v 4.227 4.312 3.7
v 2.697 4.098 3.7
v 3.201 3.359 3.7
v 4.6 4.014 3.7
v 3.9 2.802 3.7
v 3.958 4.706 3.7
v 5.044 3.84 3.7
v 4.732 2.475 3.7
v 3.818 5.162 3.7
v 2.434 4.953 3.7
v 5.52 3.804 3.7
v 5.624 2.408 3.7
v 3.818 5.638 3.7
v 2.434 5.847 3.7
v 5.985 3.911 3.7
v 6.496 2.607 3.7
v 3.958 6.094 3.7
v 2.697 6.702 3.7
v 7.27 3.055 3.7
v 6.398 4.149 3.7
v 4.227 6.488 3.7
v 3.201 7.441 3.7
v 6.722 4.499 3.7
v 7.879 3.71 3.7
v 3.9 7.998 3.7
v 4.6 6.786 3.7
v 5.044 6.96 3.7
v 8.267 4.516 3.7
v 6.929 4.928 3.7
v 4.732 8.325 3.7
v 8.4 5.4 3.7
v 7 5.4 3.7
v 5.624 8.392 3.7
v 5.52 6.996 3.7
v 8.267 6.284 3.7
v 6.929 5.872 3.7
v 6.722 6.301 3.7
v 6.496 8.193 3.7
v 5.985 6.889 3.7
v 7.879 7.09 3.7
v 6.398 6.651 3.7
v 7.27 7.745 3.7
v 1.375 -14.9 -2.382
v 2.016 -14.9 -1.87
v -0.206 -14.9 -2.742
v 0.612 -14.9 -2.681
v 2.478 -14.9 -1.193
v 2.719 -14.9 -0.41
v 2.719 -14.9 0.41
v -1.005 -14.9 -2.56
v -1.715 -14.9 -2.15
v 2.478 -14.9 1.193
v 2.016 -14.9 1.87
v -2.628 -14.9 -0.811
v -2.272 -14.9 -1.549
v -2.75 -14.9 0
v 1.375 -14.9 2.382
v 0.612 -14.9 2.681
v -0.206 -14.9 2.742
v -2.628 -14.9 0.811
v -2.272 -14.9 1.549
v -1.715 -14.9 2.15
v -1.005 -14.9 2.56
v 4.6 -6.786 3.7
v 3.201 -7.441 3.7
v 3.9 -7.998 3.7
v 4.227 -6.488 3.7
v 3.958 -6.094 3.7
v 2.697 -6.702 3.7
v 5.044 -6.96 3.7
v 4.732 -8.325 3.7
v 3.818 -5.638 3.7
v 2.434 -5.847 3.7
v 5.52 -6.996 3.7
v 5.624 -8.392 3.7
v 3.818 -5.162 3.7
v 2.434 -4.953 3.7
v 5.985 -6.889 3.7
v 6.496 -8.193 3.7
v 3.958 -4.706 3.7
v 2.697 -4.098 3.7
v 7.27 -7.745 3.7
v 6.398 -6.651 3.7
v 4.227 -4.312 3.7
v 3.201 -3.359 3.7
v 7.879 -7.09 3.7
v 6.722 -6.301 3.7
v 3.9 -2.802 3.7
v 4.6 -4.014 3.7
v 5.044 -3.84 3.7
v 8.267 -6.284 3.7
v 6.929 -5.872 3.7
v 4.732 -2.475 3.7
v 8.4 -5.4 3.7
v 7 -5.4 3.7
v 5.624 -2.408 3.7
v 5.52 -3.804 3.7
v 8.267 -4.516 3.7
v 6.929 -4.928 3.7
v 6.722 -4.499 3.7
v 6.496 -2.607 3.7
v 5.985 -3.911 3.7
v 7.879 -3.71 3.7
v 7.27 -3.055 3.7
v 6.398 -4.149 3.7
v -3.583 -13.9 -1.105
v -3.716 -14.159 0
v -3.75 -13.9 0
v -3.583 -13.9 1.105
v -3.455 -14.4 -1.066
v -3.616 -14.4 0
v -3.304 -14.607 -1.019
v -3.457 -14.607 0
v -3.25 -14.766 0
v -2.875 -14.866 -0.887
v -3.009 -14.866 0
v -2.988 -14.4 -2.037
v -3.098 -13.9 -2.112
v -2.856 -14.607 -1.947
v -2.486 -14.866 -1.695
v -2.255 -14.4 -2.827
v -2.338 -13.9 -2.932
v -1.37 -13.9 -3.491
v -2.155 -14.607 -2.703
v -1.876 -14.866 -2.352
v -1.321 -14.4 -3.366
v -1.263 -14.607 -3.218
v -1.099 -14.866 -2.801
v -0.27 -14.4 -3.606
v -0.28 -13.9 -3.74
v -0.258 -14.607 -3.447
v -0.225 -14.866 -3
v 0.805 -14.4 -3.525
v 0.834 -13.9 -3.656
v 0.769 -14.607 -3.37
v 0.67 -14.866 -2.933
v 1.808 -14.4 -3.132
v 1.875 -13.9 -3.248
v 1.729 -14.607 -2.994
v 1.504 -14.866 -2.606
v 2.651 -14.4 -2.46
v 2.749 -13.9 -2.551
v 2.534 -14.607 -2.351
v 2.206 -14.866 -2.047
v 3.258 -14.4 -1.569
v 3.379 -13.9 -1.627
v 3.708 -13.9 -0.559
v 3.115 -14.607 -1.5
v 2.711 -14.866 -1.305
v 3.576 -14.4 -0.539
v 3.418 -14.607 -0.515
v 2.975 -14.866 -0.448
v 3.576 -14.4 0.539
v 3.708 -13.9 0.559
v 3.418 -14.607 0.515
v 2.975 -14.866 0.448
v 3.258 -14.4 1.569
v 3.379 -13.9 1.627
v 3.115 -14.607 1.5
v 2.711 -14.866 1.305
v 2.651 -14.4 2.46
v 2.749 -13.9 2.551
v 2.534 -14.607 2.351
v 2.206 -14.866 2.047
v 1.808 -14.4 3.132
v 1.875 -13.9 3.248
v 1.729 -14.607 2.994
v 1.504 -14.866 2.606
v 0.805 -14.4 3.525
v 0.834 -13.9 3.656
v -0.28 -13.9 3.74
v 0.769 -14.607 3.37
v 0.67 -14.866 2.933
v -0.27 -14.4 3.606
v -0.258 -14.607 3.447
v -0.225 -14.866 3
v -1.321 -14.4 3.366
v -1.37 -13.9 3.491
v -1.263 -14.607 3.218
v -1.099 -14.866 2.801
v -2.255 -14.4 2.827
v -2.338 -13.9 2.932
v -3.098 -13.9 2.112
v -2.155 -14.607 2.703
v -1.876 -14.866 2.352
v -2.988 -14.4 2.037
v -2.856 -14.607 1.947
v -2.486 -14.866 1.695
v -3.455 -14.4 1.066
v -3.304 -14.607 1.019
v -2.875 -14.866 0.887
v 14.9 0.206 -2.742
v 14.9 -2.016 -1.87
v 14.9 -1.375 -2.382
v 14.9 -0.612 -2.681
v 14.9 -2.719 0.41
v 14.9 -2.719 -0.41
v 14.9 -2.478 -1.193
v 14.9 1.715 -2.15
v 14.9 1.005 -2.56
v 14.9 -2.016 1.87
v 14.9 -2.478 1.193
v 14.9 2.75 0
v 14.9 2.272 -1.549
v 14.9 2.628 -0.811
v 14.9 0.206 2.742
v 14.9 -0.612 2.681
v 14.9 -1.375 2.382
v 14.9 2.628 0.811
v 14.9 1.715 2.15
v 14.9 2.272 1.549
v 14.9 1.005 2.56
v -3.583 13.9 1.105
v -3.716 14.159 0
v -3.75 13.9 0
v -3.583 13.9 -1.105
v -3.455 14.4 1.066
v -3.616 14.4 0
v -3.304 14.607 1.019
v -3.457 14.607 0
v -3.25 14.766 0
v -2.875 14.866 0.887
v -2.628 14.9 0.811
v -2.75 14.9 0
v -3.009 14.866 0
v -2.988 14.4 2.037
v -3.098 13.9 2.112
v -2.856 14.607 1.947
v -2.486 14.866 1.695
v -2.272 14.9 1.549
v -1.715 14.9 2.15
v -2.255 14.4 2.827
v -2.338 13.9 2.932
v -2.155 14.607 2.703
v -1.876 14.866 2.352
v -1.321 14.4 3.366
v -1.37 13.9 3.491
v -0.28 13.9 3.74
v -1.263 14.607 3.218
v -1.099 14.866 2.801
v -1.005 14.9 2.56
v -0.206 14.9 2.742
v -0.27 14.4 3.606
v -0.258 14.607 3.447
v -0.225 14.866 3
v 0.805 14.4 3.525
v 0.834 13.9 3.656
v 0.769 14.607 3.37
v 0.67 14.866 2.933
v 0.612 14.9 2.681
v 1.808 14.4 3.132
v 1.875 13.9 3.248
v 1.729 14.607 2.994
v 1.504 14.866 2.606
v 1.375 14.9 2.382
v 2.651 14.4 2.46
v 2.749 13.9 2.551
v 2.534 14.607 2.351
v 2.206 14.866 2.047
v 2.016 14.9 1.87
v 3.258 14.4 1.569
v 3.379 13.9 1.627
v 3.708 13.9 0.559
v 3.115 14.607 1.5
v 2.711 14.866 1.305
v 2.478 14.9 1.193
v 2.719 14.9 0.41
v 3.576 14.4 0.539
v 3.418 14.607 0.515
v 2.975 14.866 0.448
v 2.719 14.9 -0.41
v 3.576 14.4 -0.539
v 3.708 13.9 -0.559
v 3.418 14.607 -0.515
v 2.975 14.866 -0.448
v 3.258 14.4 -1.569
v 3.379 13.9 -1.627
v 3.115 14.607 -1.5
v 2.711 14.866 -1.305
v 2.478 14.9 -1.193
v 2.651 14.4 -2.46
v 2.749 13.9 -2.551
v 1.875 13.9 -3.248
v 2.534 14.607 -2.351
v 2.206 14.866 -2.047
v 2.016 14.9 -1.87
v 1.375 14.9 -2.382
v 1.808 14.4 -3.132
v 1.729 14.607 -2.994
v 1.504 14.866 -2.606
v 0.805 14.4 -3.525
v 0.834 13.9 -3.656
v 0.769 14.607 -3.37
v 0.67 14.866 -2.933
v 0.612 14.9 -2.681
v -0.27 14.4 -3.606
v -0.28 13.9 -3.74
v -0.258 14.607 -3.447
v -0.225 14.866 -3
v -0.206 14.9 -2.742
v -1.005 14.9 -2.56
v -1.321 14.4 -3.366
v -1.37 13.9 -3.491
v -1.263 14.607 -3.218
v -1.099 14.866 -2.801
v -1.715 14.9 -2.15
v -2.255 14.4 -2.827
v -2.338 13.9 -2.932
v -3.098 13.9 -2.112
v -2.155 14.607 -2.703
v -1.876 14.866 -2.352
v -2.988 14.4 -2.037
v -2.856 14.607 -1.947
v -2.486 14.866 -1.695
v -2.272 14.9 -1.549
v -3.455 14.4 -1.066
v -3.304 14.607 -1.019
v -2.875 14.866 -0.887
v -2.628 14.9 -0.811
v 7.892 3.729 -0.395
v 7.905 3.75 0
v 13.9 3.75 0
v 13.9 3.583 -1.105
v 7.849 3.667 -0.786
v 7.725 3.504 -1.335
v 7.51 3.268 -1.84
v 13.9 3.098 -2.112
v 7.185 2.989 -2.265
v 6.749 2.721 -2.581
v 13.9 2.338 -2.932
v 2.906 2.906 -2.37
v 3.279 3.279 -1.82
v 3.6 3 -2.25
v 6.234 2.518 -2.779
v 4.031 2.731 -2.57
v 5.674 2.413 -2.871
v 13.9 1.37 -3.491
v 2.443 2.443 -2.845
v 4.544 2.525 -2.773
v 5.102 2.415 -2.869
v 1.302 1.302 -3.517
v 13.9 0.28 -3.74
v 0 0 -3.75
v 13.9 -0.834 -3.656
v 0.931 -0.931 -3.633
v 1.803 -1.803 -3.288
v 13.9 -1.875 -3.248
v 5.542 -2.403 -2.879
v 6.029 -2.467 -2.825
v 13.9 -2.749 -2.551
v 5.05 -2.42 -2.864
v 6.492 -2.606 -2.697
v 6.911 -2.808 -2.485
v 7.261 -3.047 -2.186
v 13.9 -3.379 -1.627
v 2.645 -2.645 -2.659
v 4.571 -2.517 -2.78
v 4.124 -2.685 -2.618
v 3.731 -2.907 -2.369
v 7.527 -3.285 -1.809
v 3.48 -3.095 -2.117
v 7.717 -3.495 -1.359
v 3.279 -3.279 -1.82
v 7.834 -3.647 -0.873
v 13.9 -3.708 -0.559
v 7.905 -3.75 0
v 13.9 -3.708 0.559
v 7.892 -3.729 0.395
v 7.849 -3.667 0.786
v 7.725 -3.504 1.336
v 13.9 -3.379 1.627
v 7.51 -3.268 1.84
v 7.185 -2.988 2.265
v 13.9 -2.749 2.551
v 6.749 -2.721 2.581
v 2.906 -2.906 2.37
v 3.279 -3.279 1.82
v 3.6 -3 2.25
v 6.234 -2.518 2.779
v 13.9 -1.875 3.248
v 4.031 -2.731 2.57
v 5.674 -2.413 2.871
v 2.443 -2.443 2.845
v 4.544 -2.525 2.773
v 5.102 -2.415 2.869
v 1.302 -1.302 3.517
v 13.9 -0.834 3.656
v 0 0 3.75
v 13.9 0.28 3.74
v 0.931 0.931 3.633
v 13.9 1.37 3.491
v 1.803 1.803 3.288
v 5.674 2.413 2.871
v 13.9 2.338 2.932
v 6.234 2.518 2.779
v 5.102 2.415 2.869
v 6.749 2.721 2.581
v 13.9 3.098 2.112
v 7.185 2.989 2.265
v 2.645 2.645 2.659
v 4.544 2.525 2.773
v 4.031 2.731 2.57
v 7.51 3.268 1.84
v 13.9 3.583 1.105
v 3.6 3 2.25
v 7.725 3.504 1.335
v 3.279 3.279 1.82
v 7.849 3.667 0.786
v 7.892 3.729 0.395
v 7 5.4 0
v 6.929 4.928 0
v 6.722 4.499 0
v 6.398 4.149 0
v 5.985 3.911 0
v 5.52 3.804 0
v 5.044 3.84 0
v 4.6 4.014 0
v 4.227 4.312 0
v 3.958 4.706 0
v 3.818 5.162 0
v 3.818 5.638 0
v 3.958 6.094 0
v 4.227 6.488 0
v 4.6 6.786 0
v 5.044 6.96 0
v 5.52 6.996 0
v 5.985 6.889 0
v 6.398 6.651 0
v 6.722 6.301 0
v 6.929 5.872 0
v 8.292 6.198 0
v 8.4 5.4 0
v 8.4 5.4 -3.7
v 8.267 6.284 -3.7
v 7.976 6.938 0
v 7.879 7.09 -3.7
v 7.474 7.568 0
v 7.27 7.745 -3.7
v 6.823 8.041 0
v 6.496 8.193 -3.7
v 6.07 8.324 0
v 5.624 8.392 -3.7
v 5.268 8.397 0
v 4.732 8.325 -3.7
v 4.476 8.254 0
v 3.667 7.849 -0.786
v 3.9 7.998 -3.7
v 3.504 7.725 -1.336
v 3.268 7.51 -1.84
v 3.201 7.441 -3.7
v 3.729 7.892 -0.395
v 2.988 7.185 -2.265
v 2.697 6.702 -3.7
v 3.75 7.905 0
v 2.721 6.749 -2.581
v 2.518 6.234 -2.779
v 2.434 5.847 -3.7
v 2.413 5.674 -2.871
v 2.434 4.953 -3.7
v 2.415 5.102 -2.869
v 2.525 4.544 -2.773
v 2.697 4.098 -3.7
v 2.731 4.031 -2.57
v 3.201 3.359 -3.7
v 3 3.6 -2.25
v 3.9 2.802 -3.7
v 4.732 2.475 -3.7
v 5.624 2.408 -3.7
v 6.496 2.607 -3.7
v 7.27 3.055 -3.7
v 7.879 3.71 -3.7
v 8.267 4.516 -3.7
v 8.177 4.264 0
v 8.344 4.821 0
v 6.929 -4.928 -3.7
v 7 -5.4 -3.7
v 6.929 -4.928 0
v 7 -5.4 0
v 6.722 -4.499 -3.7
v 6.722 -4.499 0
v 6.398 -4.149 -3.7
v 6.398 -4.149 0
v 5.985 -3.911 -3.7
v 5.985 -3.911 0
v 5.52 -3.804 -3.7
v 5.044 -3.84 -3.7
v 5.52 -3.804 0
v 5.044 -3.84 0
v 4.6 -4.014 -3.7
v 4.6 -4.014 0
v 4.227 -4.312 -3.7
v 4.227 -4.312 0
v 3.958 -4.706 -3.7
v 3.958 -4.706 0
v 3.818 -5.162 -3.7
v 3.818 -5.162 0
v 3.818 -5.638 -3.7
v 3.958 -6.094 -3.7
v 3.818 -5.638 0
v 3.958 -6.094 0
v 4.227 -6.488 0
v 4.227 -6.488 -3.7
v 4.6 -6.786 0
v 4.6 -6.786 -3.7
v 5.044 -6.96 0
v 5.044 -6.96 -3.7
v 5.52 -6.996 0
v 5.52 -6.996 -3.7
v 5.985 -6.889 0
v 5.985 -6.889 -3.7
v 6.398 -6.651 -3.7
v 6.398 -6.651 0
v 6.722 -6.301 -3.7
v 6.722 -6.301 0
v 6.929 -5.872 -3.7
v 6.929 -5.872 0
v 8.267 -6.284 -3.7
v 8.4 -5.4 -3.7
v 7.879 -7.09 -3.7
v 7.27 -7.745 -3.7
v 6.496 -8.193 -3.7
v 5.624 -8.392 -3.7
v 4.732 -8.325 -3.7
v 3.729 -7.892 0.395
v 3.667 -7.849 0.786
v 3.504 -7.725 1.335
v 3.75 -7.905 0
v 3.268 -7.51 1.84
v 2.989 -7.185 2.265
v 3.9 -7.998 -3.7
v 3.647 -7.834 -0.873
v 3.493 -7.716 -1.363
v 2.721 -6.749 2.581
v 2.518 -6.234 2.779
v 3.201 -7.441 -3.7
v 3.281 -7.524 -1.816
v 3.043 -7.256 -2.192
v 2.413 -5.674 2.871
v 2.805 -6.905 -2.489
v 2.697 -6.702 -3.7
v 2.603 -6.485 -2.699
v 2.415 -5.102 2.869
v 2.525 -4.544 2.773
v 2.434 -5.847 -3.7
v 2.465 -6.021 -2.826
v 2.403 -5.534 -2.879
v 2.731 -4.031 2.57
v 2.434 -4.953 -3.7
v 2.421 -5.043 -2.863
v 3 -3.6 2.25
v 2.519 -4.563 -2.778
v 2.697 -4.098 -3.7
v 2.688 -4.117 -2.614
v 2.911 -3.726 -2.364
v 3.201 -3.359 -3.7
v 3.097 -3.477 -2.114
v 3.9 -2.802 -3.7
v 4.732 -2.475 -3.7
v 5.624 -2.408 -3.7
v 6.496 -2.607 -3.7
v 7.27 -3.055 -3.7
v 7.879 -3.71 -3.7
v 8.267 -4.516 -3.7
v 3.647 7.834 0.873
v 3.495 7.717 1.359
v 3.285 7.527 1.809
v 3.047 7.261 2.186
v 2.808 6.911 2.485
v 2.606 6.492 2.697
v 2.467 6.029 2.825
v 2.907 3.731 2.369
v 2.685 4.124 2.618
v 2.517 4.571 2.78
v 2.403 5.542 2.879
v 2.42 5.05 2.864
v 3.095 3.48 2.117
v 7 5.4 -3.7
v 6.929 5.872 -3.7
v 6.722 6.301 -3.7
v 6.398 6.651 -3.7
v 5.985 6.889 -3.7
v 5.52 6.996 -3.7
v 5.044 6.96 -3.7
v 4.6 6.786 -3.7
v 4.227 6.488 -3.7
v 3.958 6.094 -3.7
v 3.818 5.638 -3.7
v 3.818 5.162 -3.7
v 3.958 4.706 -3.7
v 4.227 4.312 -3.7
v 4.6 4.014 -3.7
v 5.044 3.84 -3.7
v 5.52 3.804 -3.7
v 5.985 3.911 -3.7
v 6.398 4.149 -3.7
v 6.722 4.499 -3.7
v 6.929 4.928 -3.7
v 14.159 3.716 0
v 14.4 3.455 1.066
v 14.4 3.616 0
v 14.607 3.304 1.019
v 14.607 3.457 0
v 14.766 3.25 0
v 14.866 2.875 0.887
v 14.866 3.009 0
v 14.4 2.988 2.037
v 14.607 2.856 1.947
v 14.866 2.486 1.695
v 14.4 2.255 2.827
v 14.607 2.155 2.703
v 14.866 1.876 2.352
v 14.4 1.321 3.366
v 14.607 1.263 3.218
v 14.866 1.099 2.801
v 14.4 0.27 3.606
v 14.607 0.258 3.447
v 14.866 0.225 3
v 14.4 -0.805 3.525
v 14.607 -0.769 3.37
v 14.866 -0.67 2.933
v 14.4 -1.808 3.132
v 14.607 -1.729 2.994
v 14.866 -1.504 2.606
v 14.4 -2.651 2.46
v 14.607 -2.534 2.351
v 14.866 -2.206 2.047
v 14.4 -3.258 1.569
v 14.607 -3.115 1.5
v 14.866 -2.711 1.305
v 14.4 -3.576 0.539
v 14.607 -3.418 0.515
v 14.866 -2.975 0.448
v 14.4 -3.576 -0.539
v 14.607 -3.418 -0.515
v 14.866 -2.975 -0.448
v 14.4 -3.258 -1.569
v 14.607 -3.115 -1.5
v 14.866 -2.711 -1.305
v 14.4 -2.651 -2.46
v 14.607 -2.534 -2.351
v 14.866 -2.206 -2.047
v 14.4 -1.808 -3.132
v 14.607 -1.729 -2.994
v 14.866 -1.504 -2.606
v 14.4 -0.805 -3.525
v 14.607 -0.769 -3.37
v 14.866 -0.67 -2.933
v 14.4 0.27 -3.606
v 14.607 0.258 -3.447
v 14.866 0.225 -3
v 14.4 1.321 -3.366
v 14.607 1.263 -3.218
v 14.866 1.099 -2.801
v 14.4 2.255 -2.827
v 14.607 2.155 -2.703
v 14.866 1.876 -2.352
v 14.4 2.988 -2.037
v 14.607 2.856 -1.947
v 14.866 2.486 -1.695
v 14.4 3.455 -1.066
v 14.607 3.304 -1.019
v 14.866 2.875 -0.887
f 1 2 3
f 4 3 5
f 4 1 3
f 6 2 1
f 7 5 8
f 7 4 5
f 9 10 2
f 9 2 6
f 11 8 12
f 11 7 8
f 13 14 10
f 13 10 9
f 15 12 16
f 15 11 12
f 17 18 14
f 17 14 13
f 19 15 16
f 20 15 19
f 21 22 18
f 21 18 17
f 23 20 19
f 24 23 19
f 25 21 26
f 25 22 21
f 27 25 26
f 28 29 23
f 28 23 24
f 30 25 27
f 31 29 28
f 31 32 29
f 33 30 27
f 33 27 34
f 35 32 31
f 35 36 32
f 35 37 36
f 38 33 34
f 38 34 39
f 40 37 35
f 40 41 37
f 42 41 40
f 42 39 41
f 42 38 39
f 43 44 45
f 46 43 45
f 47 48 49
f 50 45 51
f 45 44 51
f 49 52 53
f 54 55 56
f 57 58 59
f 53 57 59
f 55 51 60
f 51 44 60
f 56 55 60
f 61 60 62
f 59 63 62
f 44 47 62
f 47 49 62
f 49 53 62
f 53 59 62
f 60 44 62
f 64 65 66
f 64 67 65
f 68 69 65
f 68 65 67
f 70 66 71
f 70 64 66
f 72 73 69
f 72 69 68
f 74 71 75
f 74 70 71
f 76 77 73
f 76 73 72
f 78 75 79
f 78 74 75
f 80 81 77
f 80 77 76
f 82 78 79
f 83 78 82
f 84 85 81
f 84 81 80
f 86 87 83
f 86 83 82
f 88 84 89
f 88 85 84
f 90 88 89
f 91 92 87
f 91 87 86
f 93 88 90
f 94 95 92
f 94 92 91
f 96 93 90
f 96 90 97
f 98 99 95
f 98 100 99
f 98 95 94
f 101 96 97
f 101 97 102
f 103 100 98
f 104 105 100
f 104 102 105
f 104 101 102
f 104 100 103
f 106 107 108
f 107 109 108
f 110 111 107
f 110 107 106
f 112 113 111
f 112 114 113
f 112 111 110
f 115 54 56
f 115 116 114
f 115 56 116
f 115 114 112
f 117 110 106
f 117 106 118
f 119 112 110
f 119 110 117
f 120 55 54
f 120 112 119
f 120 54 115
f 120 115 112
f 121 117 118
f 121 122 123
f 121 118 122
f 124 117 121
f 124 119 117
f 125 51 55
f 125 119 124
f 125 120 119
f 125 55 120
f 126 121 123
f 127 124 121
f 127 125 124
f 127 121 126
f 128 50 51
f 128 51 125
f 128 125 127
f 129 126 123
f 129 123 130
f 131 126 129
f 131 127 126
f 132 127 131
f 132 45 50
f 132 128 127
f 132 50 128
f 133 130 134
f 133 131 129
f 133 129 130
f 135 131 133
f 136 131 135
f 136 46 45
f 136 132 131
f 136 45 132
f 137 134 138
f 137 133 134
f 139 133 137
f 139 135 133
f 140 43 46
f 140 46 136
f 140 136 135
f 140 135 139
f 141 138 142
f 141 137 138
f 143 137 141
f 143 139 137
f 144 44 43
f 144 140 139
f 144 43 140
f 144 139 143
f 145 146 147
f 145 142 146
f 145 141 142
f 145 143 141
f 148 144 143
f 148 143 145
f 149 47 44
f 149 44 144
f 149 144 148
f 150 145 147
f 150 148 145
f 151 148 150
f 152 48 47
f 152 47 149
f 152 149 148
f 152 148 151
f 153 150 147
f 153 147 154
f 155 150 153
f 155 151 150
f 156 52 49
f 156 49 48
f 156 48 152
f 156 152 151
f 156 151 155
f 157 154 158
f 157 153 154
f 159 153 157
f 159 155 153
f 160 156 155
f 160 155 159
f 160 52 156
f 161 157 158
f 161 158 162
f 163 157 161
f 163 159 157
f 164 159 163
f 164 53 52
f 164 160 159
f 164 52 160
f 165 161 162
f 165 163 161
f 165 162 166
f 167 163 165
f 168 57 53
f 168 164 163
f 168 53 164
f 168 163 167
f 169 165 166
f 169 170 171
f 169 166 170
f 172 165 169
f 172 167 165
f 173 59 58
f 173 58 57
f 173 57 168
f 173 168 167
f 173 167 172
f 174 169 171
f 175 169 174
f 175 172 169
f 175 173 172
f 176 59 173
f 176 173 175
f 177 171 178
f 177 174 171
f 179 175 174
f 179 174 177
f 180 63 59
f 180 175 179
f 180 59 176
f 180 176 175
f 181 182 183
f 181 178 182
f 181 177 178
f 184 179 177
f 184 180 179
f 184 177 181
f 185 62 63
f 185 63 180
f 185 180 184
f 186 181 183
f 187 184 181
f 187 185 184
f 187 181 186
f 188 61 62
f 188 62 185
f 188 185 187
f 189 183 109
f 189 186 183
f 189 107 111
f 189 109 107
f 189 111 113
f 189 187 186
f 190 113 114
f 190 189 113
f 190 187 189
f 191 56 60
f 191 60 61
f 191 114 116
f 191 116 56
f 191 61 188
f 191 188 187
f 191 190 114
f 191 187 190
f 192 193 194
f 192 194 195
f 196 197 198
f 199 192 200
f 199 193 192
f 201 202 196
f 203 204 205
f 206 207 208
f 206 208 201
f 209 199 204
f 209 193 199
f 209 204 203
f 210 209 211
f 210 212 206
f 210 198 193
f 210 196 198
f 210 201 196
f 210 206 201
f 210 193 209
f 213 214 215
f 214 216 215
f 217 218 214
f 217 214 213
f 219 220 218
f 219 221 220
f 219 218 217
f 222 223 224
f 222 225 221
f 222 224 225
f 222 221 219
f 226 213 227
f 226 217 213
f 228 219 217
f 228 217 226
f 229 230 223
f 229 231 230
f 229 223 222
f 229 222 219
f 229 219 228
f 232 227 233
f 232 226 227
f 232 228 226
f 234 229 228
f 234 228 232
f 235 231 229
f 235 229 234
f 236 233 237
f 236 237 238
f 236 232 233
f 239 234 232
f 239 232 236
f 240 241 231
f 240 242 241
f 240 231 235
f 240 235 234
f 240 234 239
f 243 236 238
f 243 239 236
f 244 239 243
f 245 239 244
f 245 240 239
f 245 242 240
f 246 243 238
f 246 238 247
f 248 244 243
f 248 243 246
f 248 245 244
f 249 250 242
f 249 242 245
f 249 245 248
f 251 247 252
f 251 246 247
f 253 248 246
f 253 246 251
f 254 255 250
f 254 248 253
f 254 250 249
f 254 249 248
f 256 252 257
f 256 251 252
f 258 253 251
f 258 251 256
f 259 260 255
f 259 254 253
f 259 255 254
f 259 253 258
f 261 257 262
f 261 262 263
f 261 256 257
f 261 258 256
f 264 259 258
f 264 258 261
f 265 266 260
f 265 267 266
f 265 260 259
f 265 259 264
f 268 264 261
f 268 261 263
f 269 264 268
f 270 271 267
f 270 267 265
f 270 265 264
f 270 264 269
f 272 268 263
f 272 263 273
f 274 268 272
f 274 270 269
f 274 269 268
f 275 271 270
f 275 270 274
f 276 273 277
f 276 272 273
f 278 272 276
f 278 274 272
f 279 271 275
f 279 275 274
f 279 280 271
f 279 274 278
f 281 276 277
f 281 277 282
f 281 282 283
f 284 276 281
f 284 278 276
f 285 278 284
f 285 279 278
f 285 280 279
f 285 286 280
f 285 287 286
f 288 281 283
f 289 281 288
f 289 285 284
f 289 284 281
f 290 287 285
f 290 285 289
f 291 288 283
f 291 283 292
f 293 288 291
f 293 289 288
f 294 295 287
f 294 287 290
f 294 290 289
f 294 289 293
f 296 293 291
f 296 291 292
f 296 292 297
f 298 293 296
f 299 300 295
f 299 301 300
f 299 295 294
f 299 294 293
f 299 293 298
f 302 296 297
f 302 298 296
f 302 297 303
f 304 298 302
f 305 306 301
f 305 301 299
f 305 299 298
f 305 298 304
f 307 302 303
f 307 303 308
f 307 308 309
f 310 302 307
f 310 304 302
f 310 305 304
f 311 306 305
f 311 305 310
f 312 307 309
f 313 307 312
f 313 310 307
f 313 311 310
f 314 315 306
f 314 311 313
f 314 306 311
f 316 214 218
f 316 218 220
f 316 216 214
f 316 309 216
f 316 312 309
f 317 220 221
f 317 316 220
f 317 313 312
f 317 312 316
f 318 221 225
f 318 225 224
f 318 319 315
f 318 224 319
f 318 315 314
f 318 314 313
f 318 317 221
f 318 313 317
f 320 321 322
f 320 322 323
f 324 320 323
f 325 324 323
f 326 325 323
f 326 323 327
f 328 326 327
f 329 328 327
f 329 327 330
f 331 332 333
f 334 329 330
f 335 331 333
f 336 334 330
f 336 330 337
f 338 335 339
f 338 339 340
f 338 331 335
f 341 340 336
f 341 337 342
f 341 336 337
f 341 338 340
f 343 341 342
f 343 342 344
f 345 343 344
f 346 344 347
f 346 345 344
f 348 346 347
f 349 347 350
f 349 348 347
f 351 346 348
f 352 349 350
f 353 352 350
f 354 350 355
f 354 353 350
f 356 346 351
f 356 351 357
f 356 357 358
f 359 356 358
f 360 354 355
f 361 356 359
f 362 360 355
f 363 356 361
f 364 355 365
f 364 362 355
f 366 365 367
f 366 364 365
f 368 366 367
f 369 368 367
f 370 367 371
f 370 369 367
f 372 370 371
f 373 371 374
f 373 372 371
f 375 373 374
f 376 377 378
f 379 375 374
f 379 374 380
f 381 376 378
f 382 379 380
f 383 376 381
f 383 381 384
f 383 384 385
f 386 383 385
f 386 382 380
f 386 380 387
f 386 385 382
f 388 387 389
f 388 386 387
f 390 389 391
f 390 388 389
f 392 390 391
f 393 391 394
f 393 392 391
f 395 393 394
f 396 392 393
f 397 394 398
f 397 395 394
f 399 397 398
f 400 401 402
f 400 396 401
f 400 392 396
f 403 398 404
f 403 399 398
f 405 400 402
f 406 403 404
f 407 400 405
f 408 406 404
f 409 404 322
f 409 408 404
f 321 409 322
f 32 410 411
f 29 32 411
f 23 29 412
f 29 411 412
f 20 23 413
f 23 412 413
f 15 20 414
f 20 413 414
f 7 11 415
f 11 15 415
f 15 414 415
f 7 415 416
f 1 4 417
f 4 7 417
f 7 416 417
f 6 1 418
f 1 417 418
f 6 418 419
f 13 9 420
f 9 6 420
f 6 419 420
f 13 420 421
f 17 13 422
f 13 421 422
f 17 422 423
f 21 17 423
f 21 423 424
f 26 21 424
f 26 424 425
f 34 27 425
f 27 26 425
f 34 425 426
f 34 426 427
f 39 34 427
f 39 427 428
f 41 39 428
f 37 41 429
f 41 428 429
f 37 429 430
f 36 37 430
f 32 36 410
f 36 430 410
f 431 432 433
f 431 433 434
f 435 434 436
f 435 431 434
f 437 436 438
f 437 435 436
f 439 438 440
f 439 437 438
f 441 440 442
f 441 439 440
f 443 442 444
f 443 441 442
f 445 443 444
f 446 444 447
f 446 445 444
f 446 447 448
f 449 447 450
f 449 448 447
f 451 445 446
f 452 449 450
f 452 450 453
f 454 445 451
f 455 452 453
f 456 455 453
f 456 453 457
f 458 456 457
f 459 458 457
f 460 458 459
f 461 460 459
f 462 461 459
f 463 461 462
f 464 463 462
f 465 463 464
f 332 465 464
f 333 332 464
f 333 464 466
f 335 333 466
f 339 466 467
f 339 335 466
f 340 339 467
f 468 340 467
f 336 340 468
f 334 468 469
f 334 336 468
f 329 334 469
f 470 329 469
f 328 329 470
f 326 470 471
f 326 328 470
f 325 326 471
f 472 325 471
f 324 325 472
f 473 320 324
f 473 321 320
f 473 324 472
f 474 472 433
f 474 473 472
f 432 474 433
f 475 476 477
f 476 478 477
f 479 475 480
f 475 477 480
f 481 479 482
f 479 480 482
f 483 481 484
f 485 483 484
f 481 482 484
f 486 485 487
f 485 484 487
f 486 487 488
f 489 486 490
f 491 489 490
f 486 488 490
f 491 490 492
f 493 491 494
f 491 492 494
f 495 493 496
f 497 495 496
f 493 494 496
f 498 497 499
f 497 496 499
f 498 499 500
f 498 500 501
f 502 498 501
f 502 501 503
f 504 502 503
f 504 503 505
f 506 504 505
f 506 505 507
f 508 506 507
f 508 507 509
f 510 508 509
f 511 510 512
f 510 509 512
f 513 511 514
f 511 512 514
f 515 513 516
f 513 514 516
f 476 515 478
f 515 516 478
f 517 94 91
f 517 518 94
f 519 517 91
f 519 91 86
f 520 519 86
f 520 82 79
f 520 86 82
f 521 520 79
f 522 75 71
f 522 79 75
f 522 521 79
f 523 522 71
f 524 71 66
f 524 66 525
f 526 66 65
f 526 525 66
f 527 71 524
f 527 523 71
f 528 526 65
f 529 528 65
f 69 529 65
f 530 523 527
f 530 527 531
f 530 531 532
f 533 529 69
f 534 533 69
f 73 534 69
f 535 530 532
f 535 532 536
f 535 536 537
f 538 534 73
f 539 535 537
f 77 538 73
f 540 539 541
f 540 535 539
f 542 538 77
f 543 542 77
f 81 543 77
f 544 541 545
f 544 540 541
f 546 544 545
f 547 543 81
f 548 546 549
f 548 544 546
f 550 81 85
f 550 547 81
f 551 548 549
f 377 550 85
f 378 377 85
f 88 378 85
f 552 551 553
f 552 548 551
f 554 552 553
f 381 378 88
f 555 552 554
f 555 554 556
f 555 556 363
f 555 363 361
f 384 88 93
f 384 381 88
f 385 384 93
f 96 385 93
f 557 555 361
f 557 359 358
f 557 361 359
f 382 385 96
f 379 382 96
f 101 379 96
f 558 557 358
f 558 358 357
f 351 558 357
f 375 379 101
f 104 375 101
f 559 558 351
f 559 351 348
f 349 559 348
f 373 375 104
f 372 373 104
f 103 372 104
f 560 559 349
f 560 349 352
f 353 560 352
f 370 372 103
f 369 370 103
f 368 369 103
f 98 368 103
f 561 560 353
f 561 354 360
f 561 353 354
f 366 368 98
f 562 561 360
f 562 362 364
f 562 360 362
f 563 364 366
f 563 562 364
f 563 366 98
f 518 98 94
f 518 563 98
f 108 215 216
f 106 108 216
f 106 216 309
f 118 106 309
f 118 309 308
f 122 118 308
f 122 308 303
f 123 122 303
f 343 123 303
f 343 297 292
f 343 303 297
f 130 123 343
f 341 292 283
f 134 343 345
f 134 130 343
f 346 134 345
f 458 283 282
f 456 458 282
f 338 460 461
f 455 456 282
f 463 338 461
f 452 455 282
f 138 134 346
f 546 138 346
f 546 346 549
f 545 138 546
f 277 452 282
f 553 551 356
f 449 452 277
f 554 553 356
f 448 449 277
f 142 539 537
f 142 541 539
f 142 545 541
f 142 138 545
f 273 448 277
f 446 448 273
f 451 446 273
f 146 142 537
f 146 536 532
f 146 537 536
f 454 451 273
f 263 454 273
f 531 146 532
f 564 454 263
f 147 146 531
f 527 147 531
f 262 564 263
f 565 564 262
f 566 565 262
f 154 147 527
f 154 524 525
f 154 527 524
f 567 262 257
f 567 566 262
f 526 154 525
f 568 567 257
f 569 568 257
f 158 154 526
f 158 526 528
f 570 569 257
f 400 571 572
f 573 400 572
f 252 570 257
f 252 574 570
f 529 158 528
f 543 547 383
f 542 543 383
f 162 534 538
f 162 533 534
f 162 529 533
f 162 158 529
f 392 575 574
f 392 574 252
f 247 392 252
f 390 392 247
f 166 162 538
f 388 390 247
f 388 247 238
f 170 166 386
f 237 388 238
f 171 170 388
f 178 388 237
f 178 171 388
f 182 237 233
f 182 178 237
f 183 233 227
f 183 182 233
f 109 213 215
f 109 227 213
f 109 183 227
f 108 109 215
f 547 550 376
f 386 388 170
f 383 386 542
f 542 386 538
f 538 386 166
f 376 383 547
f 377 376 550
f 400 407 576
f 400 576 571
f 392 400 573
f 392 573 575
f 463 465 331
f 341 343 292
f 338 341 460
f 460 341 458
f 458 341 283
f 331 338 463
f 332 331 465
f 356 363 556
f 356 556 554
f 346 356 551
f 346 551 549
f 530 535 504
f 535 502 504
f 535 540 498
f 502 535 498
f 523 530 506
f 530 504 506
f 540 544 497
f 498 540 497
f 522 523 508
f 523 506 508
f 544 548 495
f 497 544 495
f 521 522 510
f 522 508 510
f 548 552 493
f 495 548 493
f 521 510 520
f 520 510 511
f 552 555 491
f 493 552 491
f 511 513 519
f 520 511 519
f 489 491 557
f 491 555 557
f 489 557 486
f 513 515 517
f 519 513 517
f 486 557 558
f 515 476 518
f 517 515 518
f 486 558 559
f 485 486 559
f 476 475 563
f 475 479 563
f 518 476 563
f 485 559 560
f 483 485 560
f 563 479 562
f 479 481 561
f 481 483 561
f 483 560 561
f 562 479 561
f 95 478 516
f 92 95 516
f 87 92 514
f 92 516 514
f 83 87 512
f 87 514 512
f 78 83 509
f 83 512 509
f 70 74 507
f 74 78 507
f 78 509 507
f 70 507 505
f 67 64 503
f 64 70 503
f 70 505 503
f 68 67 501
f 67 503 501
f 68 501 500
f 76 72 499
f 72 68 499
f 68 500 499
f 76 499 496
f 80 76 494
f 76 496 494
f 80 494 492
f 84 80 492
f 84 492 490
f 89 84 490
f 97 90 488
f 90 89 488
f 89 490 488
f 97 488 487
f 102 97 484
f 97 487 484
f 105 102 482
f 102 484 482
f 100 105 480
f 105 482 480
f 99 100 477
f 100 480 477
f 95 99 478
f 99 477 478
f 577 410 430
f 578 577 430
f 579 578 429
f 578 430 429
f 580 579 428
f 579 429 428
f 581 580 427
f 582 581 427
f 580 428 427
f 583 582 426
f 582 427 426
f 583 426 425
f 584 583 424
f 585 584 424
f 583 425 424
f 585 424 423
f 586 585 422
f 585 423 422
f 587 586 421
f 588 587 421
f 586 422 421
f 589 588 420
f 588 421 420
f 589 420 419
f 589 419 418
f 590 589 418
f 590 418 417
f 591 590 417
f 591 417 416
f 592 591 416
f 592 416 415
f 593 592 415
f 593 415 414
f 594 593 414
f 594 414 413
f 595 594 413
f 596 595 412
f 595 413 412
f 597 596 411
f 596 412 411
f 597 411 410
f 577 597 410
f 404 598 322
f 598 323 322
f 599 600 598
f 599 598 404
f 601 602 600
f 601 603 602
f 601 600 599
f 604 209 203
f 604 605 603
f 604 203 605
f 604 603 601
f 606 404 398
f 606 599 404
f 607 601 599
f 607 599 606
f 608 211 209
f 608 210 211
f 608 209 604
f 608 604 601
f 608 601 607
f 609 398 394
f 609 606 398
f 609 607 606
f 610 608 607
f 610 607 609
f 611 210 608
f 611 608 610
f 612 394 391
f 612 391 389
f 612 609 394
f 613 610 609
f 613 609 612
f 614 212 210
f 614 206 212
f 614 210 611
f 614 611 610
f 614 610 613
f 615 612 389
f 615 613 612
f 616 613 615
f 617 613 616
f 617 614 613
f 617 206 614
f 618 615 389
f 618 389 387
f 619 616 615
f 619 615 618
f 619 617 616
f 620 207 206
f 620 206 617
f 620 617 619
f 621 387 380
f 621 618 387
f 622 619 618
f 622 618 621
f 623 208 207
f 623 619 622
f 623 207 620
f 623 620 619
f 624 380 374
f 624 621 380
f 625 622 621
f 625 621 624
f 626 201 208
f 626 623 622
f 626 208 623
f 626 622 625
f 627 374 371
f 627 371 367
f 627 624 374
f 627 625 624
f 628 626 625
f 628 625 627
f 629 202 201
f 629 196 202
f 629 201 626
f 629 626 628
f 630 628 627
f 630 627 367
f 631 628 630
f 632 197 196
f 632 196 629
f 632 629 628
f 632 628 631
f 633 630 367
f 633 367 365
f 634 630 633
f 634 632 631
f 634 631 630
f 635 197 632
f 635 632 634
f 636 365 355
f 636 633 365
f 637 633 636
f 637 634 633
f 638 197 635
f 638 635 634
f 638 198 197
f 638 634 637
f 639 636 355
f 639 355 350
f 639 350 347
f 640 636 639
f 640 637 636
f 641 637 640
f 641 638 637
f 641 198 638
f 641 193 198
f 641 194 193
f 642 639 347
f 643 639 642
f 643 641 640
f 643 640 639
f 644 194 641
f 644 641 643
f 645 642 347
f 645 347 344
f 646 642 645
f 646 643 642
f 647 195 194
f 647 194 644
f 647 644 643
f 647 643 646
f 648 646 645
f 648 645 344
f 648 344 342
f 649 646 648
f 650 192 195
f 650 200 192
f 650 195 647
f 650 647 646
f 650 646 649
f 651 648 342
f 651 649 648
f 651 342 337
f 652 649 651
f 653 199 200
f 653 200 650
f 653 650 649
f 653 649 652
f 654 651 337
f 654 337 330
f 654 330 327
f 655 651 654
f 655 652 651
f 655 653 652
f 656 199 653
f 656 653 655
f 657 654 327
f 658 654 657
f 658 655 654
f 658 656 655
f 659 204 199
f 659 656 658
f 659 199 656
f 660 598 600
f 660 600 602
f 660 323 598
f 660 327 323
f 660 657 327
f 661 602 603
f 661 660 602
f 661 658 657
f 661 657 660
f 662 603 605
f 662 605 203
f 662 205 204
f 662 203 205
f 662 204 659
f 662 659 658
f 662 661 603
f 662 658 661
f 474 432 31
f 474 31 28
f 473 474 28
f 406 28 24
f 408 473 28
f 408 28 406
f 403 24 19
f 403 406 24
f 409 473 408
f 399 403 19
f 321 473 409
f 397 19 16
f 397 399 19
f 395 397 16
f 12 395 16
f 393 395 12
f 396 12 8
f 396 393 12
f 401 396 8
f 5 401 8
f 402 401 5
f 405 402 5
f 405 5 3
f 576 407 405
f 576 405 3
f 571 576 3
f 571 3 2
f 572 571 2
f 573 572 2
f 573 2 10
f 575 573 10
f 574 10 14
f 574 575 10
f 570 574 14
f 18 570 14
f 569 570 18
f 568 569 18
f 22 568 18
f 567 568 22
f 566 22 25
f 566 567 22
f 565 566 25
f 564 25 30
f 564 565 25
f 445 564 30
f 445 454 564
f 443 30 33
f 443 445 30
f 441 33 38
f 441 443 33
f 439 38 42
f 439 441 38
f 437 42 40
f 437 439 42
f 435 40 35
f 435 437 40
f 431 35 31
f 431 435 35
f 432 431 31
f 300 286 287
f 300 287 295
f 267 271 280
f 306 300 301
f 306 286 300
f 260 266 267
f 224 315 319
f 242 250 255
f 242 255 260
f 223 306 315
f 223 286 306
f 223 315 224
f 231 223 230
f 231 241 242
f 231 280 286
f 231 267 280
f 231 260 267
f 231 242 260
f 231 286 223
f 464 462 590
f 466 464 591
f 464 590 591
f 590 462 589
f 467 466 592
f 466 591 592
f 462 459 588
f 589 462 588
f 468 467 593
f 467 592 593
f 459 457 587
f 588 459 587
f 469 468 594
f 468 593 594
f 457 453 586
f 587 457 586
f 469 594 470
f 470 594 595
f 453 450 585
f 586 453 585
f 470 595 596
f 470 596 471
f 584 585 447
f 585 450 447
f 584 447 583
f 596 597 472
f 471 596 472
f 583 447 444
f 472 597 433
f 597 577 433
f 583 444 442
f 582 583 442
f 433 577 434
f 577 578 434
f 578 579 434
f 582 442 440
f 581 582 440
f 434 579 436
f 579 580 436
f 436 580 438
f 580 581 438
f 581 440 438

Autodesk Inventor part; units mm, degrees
ref_plane "YZ Plane" through (0, 0, 0) normal (1, 0, 0) x (0, 1, 0)
ref_plane "XZ Plane" through (0, 0, 0) normal (0, 1, 0) x (-1, 0, 0)
ref_plane "XY Plane" through (0, 0, 0) normal (0, 0, 1) x (1, 0, 0)
sketch "Sketch1" plane through (0, 0, 0) normal (0, 1, 0) x (-1, 0, 0)
  circle A0 centre (0, 0) radius 3.75
  dimension "d0" = 7.5
extrude "Extrusion1" add sketch "Sketch1" along normal mid plane 29.8
sketch "Sketch2" plane through (0, 0, 0) normal (1, 0, 0) x (0, 1, 0)
  line L0 (-14.9, 3.75) -> (-14.9, -3.75) projected
  line L1 (14.9, -3.75) -> (14.9, 3.75) projected
  circle A0 centre (0, 0) radius 3.75
extrude "Extrusion2" add sketch "Sketch2" along normal blind 14.9
sketch "Sketch3" plane through (0, 0, 0) normal (0, 0, 1) x (1, 0, 0)
  line L0 (0, 13.8301) -> (0, -13.8301) construction
  line L1 (-5.2476, 0) -> (14.0163, 0) construction
  circle A0 centre (5.4, 5.4) radius 1.6
  circle A1 centre (5.4, -5.4) radius 1.6
  circle A2 centre (5.4, 5.4) radius 3
  circle A3 centre (5.4, -5.4) radius 3
  point P0 (0, 0)
  point P1 (0, 0)
  dimension "d5" = 5.4
  dimension "d6" = 5.4
  dimension "d7" = 3.2
  dimension "d8" = 3.2
  dimension "d9" = 6
  dimension "d10" = 6
  dimension "d11" = 5.4
  dimension "d12" = 5.4
extrude "Extrusion3" add sketch "Sketch3" along normal mid plane 7.4
fillet "Fillet1" radius 1 3 edges at (3.75, 14.9, 0) (14.9, -3.75, 0) (3.75, -14.9, 0)
properties part number "Union Tee 1-8 KQ2T01-00A SMC"
